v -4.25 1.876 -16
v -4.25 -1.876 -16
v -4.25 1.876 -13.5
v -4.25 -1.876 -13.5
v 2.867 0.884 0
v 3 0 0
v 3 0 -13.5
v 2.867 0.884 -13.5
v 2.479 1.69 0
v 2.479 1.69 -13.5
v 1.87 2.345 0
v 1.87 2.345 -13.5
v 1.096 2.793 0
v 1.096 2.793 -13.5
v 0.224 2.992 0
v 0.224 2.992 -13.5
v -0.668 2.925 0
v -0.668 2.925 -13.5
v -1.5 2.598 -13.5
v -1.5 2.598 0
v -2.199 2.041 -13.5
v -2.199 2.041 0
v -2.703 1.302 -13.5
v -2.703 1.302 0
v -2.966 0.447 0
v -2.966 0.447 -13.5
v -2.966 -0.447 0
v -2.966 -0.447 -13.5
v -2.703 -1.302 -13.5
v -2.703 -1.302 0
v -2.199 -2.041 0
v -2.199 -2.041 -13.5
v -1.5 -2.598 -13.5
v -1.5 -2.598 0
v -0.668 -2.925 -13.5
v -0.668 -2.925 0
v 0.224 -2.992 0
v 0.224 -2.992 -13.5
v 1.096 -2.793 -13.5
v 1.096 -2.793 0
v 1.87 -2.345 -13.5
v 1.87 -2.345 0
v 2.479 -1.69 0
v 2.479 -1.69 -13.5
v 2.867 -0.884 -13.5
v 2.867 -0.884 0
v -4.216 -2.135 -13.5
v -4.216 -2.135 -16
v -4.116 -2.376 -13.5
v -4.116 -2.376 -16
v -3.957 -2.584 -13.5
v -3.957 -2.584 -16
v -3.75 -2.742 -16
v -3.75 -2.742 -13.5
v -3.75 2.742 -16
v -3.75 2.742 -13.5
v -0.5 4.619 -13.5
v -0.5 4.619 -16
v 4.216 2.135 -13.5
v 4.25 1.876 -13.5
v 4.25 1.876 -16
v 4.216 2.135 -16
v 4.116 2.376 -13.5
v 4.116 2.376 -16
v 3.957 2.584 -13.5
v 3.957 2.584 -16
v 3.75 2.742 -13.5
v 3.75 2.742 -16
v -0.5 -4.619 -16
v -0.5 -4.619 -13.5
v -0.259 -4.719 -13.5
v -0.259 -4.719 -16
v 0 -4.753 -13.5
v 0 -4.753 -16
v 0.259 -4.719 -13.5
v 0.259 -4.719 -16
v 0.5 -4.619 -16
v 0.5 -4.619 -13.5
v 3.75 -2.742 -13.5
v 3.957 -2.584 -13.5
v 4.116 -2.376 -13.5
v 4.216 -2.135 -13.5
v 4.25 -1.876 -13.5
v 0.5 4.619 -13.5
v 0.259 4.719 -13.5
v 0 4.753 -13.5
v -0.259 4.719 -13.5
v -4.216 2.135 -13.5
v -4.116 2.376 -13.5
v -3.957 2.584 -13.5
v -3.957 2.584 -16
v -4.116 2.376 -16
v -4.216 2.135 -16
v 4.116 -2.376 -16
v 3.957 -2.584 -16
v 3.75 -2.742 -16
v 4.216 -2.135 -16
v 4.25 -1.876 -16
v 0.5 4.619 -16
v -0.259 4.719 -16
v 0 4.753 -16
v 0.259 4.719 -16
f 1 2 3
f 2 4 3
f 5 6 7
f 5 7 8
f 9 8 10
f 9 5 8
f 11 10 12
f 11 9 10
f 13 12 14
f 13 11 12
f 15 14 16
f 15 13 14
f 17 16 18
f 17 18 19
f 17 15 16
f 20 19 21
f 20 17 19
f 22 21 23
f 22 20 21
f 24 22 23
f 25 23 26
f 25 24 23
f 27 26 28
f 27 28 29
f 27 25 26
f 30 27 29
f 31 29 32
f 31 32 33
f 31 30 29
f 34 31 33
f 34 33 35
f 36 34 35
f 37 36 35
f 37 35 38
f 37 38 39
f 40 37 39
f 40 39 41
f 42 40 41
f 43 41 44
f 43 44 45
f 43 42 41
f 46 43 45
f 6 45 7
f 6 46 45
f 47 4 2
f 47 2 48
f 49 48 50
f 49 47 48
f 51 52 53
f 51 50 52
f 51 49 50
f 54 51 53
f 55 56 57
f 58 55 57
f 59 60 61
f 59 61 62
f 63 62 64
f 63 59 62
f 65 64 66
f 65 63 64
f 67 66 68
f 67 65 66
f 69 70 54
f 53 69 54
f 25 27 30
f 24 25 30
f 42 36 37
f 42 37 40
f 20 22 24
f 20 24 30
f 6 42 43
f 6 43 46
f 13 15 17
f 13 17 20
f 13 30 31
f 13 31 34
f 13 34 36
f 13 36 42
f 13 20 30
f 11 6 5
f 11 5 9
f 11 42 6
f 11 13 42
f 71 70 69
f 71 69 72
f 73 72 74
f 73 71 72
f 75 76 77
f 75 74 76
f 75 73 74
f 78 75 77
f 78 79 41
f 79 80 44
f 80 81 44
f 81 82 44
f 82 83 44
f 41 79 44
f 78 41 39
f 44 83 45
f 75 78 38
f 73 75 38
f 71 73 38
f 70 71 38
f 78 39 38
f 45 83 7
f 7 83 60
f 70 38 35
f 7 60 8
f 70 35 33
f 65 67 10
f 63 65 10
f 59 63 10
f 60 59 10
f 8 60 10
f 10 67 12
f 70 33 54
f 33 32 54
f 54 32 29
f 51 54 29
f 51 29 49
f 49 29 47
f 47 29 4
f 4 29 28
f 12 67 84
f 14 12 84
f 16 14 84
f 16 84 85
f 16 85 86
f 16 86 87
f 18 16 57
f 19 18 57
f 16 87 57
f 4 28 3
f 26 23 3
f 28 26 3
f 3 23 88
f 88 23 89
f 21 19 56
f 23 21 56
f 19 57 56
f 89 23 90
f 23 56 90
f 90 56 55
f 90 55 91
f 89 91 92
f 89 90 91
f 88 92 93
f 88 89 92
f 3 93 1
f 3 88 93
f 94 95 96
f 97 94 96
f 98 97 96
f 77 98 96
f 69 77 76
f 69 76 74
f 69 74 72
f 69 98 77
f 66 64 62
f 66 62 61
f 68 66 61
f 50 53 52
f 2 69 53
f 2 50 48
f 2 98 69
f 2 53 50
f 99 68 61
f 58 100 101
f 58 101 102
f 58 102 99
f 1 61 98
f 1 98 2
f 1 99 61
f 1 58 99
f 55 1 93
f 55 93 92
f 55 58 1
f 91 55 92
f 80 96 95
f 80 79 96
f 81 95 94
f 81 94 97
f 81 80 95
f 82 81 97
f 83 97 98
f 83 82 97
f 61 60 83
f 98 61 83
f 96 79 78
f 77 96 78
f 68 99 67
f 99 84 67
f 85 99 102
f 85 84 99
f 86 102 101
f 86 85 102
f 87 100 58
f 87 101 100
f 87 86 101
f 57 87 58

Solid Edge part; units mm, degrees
sketch "Sketch1" plane through (0, 0, 0) normal (0, 0, 1) x (1, 0, 0)
  circle A0 centre (0, 0) radius 3
extrude "Protrusion1" add sketch "Sketch1" against normal blind 13.5
sketch "Sketch2" plane through (0, 0, -13.5) normal (0, 0, -1) x (-1, 0, 0)
  line L0 (-3.75, -2.7424) -> (-0.5, -4.6188)
  arc A0 (-0.5, -4.6188) -> (0.5, -4.6188) centre (0, -3.7528) ccw
  line L1 (0.5, -4.6188) -> (3.75, -2.7424)
  arc A1 (3.75, -2.7424) -> (4.25, -1.8764) centre (3.25, -1.8764) ccw
  line L2 (4.25, -1.8764) -> (4.25, 1.8764)
  arc A2 (4.25, 1.8764) -> (3.75, 2.7424) centre (3.25, 1.8764) ccw
  line L3 (3.75, 2.7424) -> (0.5, 4.6188)
  arc A3 (0.5, 4.6188) -> (-0.5, 4.6188) centre (0, 3.7528) ccw
  line L4 (-0.5, 4.6188) -> (-3.75, 2.7424)
  arc A4 (-3.75, 2.7424) -> (-4.25, 1.8764) centre (-3.25, 1.8764) ccw
  line L5 (-4.25, 1.8764) -> (-4.25, -1.8764)
  arc A5 (-3.75, -2.7424) -> (-4.25, -1.8764) centre (-3.25, -1.8764) cw
extrude "ExtrudedProtrusion_2" add sketch "Sketch2" along normal blind 2.5
